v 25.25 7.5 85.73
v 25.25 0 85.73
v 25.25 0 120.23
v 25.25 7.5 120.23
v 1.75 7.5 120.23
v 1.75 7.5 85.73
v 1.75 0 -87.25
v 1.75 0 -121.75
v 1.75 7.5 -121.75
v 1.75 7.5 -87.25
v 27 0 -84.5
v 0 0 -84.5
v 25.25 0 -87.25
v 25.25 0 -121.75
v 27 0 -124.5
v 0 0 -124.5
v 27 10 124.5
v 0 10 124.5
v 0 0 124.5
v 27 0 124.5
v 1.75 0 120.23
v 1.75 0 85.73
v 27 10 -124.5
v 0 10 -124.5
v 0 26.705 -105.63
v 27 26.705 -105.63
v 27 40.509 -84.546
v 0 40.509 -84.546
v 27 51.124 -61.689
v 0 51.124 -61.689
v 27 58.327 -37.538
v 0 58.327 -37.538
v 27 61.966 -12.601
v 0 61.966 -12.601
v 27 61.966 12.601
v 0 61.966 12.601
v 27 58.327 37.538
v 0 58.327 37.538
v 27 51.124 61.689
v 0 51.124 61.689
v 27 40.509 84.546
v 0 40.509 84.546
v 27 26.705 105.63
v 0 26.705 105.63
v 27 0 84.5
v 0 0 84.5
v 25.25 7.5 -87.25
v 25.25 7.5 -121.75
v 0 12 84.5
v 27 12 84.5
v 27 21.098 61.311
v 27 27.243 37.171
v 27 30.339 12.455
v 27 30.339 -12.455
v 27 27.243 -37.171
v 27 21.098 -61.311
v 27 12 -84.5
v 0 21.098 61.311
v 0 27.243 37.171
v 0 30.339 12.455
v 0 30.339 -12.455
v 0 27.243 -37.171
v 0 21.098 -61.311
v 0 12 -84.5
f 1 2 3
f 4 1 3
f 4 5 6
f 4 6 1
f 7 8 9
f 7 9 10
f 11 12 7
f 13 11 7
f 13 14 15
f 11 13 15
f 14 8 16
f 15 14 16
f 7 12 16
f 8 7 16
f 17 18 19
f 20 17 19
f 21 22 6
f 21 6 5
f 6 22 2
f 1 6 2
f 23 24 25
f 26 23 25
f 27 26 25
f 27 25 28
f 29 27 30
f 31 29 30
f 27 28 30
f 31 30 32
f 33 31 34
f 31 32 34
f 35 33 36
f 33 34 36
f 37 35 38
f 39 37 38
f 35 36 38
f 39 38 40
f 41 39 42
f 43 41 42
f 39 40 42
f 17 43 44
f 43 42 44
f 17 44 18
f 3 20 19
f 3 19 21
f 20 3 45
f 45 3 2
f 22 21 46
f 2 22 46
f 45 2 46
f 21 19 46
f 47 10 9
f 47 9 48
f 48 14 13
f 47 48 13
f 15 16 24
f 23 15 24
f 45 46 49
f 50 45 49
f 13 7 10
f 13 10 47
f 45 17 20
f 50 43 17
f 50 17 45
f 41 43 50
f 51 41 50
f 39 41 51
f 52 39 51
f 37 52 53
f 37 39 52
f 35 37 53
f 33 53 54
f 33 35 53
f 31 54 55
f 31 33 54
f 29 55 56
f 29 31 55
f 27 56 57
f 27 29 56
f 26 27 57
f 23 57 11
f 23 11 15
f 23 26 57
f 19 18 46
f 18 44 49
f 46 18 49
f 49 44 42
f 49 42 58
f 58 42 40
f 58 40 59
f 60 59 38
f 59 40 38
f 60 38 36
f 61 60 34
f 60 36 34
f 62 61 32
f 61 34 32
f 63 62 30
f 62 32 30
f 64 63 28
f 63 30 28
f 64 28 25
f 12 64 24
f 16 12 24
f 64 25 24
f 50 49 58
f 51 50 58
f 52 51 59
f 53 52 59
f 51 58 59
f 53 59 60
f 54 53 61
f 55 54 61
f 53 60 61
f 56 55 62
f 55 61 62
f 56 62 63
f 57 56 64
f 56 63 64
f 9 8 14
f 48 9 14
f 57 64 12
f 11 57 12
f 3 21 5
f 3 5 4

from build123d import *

# Parameters (mm, degrees)
BOSS_EXTRUDE1_DEPTH = 27
SKETCH3_W           = 23.5
SKETCH3_H           = 34.5
CUT_EXTRUDE1_DEPTH  = 7.5


with BuildPart() as part:
    # Sketch1 → Boss-Extrude1 (new body)
    with BuildSketch(Plane(origin=(0, 0, 0), x_dir=(0, 0, -1), z_dir=(1, 0, 0))):
        with BuildLine():
            Line((-124.5, 0), (-84.5, 0))
            Line((-84.5, 0), (-84.5, 12))
            ThreePointArc((-84.5, 12), (0, 30.7274152), (84.5, 12))
            Line((84.5, 12), (84.5, 0))
            Line((84.5, 0), (124.5, 0))
            Line((124.5, 0), (124.5, 10))
            ThreePointArc((124.5, 10), (0, 62.423059842), (-124.5, 10))
            Line((-124.5, 10), (-124.5, 0))
        make_face()
    extrude(amount=BOSS_EXTRUDE1_DEPTH)

    # Sketch3 → Cut-Extrude1 (cut)
    with BuildSketch(Plane.XZ):
        with Locations((13.5, 102.98)):
            Rectangle(SKETCH3_W, SKETCH3_H)
        with Locations((13.5, -104.5)):
            Rectangle(SKETCH3_W, SKETCH3_H)
    extrude(amount=-CUT_EXTRUDE1_DEPTH, mode=Mode.SUBTRACT)


solid = part.part
